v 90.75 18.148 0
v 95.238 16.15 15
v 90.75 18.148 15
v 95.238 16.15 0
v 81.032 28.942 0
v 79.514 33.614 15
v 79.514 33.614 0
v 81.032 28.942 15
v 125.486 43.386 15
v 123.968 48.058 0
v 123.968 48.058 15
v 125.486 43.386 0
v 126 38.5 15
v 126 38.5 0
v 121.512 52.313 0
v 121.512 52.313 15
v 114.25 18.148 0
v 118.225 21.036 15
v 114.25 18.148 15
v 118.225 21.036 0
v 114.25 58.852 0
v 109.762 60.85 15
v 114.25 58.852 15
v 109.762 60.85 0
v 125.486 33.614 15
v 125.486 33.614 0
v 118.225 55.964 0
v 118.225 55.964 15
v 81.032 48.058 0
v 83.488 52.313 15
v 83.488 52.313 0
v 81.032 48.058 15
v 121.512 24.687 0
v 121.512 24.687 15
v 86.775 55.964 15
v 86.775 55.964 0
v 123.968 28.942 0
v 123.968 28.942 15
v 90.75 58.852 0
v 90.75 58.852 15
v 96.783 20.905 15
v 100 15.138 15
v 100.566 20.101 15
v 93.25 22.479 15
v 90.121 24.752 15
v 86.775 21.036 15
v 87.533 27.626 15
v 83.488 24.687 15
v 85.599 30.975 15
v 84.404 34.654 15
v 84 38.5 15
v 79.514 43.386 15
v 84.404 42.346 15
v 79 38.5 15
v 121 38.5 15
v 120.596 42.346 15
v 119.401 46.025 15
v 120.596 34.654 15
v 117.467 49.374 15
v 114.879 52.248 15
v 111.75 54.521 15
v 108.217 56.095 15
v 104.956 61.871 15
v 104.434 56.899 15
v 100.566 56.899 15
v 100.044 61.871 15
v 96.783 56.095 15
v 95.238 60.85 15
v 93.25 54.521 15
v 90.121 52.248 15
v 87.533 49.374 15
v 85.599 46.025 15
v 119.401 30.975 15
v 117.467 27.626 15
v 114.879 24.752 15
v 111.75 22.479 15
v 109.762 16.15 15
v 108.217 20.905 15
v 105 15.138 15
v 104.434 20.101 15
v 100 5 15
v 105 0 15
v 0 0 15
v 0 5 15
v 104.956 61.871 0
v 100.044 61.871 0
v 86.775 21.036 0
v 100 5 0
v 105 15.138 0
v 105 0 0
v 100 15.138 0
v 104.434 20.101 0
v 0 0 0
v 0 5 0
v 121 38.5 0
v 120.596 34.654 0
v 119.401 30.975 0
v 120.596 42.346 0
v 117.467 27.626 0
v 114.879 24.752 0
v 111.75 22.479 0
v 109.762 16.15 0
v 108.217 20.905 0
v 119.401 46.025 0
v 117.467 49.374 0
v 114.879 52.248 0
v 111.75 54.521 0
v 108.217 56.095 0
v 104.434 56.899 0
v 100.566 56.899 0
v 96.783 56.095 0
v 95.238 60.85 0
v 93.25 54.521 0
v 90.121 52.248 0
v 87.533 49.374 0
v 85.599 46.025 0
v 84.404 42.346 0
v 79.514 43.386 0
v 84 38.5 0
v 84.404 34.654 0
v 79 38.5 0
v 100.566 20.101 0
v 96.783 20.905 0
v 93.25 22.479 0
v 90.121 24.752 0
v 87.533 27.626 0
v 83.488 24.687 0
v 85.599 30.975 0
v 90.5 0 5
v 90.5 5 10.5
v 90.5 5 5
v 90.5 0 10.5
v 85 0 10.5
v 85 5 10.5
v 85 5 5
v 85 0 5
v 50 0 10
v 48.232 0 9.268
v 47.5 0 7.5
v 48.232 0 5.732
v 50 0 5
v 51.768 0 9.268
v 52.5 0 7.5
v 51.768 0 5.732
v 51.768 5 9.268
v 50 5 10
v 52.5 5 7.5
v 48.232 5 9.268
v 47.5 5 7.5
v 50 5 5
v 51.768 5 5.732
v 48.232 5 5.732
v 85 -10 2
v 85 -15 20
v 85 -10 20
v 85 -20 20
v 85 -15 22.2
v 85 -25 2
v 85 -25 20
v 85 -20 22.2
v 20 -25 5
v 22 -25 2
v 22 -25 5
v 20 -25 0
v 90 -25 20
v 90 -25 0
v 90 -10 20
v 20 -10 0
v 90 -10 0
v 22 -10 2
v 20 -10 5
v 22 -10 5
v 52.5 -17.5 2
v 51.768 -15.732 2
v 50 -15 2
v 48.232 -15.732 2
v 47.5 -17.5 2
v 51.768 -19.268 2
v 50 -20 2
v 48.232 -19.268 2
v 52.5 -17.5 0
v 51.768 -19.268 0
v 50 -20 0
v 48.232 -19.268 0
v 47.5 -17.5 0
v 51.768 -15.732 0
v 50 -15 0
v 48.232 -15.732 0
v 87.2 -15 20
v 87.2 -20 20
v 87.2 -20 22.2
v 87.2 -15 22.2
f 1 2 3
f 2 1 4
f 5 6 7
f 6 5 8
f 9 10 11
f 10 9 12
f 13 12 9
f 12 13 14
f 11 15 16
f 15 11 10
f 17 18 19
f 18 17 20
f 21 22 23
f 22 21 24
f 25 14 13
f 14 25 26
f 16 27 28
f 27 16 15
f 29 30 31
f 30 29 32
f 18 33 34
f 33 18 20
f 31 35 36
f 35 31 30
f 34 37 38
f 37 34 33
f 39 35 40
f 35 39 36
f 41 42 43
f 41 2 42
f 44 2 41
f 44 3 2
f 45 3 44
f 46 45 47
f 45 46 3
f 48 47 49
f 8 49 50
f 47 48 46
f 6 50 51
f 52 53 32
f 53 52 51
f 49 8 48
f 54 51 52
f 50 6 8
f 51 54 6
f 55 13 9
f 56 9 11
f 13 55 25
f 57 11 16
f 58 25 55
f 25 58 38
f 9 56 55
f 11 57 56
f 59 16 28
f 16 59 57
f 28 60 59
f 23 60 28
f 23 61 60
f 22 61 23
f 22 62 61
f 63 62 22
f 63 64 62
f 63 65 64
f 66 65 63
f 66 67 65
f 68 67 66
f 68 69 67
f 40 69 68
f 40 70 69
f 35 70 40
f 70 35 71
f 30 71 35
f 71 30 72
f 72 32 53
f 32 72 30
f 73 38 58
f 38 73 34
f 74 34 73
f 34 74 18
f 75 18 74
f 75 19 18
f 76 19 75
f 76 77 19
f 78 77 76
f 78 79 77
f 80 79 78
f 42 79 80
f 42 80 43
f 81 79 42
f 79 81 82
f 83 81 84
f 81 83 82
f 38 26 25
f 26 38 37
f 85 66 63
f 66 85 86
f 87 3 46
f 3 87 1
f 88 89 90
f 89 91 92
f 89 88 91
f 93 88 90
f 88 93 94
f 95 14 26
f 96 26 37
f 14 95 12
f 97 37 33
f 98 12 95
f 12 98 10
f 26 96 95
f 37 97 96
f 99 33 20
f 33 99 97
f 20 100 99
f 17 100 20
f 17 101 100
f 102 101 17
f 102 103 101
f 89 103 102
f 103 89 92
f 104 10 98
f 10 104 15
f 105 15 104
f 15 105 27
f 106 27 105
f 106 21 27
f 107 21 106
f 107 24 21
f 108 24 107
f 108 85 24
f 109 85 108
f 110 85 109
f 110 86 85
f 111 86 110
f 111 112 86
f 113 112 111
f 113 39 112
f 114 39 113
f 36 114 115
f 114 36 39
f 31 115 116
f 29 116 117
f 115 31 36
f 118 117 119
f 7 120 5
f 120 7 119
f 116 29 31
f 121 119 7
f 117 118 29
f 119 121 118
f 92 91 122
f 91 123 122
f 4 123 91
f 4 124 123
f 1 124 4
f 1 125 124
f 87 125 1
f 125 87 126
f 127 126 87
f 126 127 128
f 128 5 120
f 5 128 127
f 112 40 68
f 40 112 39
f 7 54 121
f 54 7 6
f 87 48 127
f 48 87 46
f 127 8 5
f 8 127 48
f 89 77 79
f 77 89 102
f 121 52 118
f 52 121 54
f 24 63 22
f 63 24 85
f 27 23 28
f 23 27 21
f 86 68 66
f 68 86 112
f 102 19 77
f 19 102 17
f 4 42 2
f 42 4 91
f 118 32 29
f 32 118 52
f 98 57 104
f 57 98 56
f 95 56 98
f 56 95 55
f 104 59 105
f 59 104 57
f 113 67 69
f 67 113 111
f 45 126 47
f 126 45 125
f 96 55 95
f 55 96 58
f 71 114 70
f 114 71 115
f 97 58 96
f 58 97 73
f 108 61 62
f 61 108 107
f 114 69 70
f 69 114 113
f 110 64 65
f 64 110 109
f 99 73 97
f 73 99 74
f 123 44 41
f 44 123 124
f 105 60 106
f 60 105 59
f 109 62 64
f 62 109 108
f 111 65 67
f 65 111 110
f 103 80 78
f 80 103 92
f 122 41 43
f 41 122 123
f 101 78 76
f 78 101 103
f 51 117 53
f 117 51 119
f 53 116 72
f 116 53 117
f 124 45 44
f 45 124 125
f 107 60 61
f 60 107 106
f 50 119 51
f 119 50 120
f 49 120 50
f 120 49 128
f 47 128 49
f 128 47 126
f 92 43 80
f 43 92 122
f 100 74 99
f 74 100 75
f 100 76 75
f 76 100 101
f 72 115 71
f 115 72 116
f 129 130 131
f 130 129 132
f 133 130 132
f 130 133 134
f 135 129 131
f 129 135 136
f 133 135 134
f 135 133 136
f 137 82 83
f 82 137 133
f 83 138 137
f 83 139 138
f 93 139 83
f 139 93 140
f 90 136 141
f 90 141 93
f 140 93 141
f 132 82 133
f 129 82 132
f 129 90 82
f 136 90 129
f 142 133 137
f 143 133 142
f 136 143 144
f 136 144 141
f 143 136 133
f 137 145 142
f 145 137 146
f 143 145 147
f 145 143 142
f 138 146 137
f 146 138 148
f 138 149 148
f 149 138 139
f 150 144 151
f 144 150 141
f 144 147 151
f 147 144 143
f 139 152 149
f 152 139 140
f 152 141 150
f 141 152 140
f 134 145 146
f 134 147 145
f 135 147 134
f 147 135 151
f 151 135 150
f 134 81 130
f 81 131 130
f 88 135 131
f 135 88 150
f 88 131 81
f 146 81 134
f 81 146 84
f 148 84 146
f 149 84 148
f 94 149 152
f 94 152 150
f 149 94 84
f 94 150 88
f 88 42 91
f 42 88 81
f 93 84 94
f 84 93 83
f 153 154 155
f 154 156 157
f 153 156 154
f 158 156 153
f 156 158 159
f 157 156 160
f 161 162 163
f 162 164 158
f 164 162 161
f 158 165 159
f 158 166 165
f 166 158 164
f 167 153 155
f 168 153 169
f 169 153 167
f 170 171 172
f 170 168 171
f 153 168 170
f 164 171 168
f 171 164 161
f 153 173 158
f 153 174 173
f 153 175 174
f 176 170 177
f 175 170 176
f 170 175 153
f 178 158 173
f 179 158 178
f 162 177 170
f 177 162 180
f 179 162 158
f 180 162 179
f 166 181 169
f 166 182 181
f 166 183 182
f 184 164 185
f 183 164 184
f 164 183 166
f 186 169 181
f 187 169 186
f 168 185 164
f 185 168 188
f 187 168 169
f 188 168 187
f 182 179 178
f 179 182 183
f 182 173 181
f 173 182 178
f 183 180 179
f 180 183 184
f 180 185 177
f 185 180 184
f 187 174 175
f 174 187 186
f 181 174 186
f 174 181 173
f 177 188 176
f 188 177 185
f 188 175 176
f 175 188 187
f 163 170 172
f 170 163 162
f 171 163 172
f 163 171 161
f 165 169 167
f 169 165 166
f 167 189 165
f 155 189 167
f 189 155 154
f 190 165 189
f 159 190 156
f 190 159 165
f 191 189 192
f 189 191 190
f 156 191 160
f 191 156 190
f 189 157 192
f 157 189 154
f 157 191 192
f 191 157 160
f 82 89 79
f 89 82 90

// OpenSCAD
// Drzak teplomeru do plastoveho okna 
// Thermometer holder to plastic window
// need two same parts - top and bootom holder is identical
// vyska drzaku
hh1=15;
// vnitrni prumer drzaku teplomeru
dht = 37;
// sirka steny
hwidth = 5;
pwidth = 2;
// delka drzaku
lhold = 100;
// odsun kolecka od konce zakladu drzaku
lh2 = 20;
// posun operky od konce zakladu drzaku
lpos = 15;
// odsun diry pro sroubek - musi byt vic nez lh2
lh1 = 50;
// prumer diry pro sroubek
dsr = 5;
// zdvih druheho dilu
lh3 = 5;

translate([lhold+hwidth/2,lh2+dht/2,0])
   difference()
   {
    cylinder(h=hh1, r=(dht/2+hwidth));
    cylinder(h=hh1, r=dht/2);   
   }
difference()
  { 
   cube([lhold,hwidth,hh1]);
   union()
   {
    translate([lhold-lpos,0,hh1/2-hh1/6]) cube([hwidth*1.1,hwidth*1.1,(hh1/3)*1.1]);
    translate([lhold-lh1,hwidth,hh1/2]) rotate([90,0,0]) cylinder(h=hwidth,d=dsr);
   }   
  }
translate([lhold,0,0]) cube([hwidth,lh2,hh1]);  
  
// druhy dil
translate([0, -10, 0])
rotate([90,0,0]) {
 translate([20,0,0]) difference() {   
    cube([lhold-lpos-20,pwidth,hh1]);
    translate([lhold-lh1-20,pwidth,hh1/2]) rotate([90,0,0]) cylinder(h=pwidth,d=dsr);
    } 
 translate([20,0,0]) cube([pwidth,lh3,hh1]);     
 translate([lhold-lpos,0,0]) cube([hwidth,20,hh1]);     
 translate([lhold-lpos,20,hh1/2-hh1/6]) cube([pwidth*1.1,pwidth*1.1,hh1/3]);   
}  
